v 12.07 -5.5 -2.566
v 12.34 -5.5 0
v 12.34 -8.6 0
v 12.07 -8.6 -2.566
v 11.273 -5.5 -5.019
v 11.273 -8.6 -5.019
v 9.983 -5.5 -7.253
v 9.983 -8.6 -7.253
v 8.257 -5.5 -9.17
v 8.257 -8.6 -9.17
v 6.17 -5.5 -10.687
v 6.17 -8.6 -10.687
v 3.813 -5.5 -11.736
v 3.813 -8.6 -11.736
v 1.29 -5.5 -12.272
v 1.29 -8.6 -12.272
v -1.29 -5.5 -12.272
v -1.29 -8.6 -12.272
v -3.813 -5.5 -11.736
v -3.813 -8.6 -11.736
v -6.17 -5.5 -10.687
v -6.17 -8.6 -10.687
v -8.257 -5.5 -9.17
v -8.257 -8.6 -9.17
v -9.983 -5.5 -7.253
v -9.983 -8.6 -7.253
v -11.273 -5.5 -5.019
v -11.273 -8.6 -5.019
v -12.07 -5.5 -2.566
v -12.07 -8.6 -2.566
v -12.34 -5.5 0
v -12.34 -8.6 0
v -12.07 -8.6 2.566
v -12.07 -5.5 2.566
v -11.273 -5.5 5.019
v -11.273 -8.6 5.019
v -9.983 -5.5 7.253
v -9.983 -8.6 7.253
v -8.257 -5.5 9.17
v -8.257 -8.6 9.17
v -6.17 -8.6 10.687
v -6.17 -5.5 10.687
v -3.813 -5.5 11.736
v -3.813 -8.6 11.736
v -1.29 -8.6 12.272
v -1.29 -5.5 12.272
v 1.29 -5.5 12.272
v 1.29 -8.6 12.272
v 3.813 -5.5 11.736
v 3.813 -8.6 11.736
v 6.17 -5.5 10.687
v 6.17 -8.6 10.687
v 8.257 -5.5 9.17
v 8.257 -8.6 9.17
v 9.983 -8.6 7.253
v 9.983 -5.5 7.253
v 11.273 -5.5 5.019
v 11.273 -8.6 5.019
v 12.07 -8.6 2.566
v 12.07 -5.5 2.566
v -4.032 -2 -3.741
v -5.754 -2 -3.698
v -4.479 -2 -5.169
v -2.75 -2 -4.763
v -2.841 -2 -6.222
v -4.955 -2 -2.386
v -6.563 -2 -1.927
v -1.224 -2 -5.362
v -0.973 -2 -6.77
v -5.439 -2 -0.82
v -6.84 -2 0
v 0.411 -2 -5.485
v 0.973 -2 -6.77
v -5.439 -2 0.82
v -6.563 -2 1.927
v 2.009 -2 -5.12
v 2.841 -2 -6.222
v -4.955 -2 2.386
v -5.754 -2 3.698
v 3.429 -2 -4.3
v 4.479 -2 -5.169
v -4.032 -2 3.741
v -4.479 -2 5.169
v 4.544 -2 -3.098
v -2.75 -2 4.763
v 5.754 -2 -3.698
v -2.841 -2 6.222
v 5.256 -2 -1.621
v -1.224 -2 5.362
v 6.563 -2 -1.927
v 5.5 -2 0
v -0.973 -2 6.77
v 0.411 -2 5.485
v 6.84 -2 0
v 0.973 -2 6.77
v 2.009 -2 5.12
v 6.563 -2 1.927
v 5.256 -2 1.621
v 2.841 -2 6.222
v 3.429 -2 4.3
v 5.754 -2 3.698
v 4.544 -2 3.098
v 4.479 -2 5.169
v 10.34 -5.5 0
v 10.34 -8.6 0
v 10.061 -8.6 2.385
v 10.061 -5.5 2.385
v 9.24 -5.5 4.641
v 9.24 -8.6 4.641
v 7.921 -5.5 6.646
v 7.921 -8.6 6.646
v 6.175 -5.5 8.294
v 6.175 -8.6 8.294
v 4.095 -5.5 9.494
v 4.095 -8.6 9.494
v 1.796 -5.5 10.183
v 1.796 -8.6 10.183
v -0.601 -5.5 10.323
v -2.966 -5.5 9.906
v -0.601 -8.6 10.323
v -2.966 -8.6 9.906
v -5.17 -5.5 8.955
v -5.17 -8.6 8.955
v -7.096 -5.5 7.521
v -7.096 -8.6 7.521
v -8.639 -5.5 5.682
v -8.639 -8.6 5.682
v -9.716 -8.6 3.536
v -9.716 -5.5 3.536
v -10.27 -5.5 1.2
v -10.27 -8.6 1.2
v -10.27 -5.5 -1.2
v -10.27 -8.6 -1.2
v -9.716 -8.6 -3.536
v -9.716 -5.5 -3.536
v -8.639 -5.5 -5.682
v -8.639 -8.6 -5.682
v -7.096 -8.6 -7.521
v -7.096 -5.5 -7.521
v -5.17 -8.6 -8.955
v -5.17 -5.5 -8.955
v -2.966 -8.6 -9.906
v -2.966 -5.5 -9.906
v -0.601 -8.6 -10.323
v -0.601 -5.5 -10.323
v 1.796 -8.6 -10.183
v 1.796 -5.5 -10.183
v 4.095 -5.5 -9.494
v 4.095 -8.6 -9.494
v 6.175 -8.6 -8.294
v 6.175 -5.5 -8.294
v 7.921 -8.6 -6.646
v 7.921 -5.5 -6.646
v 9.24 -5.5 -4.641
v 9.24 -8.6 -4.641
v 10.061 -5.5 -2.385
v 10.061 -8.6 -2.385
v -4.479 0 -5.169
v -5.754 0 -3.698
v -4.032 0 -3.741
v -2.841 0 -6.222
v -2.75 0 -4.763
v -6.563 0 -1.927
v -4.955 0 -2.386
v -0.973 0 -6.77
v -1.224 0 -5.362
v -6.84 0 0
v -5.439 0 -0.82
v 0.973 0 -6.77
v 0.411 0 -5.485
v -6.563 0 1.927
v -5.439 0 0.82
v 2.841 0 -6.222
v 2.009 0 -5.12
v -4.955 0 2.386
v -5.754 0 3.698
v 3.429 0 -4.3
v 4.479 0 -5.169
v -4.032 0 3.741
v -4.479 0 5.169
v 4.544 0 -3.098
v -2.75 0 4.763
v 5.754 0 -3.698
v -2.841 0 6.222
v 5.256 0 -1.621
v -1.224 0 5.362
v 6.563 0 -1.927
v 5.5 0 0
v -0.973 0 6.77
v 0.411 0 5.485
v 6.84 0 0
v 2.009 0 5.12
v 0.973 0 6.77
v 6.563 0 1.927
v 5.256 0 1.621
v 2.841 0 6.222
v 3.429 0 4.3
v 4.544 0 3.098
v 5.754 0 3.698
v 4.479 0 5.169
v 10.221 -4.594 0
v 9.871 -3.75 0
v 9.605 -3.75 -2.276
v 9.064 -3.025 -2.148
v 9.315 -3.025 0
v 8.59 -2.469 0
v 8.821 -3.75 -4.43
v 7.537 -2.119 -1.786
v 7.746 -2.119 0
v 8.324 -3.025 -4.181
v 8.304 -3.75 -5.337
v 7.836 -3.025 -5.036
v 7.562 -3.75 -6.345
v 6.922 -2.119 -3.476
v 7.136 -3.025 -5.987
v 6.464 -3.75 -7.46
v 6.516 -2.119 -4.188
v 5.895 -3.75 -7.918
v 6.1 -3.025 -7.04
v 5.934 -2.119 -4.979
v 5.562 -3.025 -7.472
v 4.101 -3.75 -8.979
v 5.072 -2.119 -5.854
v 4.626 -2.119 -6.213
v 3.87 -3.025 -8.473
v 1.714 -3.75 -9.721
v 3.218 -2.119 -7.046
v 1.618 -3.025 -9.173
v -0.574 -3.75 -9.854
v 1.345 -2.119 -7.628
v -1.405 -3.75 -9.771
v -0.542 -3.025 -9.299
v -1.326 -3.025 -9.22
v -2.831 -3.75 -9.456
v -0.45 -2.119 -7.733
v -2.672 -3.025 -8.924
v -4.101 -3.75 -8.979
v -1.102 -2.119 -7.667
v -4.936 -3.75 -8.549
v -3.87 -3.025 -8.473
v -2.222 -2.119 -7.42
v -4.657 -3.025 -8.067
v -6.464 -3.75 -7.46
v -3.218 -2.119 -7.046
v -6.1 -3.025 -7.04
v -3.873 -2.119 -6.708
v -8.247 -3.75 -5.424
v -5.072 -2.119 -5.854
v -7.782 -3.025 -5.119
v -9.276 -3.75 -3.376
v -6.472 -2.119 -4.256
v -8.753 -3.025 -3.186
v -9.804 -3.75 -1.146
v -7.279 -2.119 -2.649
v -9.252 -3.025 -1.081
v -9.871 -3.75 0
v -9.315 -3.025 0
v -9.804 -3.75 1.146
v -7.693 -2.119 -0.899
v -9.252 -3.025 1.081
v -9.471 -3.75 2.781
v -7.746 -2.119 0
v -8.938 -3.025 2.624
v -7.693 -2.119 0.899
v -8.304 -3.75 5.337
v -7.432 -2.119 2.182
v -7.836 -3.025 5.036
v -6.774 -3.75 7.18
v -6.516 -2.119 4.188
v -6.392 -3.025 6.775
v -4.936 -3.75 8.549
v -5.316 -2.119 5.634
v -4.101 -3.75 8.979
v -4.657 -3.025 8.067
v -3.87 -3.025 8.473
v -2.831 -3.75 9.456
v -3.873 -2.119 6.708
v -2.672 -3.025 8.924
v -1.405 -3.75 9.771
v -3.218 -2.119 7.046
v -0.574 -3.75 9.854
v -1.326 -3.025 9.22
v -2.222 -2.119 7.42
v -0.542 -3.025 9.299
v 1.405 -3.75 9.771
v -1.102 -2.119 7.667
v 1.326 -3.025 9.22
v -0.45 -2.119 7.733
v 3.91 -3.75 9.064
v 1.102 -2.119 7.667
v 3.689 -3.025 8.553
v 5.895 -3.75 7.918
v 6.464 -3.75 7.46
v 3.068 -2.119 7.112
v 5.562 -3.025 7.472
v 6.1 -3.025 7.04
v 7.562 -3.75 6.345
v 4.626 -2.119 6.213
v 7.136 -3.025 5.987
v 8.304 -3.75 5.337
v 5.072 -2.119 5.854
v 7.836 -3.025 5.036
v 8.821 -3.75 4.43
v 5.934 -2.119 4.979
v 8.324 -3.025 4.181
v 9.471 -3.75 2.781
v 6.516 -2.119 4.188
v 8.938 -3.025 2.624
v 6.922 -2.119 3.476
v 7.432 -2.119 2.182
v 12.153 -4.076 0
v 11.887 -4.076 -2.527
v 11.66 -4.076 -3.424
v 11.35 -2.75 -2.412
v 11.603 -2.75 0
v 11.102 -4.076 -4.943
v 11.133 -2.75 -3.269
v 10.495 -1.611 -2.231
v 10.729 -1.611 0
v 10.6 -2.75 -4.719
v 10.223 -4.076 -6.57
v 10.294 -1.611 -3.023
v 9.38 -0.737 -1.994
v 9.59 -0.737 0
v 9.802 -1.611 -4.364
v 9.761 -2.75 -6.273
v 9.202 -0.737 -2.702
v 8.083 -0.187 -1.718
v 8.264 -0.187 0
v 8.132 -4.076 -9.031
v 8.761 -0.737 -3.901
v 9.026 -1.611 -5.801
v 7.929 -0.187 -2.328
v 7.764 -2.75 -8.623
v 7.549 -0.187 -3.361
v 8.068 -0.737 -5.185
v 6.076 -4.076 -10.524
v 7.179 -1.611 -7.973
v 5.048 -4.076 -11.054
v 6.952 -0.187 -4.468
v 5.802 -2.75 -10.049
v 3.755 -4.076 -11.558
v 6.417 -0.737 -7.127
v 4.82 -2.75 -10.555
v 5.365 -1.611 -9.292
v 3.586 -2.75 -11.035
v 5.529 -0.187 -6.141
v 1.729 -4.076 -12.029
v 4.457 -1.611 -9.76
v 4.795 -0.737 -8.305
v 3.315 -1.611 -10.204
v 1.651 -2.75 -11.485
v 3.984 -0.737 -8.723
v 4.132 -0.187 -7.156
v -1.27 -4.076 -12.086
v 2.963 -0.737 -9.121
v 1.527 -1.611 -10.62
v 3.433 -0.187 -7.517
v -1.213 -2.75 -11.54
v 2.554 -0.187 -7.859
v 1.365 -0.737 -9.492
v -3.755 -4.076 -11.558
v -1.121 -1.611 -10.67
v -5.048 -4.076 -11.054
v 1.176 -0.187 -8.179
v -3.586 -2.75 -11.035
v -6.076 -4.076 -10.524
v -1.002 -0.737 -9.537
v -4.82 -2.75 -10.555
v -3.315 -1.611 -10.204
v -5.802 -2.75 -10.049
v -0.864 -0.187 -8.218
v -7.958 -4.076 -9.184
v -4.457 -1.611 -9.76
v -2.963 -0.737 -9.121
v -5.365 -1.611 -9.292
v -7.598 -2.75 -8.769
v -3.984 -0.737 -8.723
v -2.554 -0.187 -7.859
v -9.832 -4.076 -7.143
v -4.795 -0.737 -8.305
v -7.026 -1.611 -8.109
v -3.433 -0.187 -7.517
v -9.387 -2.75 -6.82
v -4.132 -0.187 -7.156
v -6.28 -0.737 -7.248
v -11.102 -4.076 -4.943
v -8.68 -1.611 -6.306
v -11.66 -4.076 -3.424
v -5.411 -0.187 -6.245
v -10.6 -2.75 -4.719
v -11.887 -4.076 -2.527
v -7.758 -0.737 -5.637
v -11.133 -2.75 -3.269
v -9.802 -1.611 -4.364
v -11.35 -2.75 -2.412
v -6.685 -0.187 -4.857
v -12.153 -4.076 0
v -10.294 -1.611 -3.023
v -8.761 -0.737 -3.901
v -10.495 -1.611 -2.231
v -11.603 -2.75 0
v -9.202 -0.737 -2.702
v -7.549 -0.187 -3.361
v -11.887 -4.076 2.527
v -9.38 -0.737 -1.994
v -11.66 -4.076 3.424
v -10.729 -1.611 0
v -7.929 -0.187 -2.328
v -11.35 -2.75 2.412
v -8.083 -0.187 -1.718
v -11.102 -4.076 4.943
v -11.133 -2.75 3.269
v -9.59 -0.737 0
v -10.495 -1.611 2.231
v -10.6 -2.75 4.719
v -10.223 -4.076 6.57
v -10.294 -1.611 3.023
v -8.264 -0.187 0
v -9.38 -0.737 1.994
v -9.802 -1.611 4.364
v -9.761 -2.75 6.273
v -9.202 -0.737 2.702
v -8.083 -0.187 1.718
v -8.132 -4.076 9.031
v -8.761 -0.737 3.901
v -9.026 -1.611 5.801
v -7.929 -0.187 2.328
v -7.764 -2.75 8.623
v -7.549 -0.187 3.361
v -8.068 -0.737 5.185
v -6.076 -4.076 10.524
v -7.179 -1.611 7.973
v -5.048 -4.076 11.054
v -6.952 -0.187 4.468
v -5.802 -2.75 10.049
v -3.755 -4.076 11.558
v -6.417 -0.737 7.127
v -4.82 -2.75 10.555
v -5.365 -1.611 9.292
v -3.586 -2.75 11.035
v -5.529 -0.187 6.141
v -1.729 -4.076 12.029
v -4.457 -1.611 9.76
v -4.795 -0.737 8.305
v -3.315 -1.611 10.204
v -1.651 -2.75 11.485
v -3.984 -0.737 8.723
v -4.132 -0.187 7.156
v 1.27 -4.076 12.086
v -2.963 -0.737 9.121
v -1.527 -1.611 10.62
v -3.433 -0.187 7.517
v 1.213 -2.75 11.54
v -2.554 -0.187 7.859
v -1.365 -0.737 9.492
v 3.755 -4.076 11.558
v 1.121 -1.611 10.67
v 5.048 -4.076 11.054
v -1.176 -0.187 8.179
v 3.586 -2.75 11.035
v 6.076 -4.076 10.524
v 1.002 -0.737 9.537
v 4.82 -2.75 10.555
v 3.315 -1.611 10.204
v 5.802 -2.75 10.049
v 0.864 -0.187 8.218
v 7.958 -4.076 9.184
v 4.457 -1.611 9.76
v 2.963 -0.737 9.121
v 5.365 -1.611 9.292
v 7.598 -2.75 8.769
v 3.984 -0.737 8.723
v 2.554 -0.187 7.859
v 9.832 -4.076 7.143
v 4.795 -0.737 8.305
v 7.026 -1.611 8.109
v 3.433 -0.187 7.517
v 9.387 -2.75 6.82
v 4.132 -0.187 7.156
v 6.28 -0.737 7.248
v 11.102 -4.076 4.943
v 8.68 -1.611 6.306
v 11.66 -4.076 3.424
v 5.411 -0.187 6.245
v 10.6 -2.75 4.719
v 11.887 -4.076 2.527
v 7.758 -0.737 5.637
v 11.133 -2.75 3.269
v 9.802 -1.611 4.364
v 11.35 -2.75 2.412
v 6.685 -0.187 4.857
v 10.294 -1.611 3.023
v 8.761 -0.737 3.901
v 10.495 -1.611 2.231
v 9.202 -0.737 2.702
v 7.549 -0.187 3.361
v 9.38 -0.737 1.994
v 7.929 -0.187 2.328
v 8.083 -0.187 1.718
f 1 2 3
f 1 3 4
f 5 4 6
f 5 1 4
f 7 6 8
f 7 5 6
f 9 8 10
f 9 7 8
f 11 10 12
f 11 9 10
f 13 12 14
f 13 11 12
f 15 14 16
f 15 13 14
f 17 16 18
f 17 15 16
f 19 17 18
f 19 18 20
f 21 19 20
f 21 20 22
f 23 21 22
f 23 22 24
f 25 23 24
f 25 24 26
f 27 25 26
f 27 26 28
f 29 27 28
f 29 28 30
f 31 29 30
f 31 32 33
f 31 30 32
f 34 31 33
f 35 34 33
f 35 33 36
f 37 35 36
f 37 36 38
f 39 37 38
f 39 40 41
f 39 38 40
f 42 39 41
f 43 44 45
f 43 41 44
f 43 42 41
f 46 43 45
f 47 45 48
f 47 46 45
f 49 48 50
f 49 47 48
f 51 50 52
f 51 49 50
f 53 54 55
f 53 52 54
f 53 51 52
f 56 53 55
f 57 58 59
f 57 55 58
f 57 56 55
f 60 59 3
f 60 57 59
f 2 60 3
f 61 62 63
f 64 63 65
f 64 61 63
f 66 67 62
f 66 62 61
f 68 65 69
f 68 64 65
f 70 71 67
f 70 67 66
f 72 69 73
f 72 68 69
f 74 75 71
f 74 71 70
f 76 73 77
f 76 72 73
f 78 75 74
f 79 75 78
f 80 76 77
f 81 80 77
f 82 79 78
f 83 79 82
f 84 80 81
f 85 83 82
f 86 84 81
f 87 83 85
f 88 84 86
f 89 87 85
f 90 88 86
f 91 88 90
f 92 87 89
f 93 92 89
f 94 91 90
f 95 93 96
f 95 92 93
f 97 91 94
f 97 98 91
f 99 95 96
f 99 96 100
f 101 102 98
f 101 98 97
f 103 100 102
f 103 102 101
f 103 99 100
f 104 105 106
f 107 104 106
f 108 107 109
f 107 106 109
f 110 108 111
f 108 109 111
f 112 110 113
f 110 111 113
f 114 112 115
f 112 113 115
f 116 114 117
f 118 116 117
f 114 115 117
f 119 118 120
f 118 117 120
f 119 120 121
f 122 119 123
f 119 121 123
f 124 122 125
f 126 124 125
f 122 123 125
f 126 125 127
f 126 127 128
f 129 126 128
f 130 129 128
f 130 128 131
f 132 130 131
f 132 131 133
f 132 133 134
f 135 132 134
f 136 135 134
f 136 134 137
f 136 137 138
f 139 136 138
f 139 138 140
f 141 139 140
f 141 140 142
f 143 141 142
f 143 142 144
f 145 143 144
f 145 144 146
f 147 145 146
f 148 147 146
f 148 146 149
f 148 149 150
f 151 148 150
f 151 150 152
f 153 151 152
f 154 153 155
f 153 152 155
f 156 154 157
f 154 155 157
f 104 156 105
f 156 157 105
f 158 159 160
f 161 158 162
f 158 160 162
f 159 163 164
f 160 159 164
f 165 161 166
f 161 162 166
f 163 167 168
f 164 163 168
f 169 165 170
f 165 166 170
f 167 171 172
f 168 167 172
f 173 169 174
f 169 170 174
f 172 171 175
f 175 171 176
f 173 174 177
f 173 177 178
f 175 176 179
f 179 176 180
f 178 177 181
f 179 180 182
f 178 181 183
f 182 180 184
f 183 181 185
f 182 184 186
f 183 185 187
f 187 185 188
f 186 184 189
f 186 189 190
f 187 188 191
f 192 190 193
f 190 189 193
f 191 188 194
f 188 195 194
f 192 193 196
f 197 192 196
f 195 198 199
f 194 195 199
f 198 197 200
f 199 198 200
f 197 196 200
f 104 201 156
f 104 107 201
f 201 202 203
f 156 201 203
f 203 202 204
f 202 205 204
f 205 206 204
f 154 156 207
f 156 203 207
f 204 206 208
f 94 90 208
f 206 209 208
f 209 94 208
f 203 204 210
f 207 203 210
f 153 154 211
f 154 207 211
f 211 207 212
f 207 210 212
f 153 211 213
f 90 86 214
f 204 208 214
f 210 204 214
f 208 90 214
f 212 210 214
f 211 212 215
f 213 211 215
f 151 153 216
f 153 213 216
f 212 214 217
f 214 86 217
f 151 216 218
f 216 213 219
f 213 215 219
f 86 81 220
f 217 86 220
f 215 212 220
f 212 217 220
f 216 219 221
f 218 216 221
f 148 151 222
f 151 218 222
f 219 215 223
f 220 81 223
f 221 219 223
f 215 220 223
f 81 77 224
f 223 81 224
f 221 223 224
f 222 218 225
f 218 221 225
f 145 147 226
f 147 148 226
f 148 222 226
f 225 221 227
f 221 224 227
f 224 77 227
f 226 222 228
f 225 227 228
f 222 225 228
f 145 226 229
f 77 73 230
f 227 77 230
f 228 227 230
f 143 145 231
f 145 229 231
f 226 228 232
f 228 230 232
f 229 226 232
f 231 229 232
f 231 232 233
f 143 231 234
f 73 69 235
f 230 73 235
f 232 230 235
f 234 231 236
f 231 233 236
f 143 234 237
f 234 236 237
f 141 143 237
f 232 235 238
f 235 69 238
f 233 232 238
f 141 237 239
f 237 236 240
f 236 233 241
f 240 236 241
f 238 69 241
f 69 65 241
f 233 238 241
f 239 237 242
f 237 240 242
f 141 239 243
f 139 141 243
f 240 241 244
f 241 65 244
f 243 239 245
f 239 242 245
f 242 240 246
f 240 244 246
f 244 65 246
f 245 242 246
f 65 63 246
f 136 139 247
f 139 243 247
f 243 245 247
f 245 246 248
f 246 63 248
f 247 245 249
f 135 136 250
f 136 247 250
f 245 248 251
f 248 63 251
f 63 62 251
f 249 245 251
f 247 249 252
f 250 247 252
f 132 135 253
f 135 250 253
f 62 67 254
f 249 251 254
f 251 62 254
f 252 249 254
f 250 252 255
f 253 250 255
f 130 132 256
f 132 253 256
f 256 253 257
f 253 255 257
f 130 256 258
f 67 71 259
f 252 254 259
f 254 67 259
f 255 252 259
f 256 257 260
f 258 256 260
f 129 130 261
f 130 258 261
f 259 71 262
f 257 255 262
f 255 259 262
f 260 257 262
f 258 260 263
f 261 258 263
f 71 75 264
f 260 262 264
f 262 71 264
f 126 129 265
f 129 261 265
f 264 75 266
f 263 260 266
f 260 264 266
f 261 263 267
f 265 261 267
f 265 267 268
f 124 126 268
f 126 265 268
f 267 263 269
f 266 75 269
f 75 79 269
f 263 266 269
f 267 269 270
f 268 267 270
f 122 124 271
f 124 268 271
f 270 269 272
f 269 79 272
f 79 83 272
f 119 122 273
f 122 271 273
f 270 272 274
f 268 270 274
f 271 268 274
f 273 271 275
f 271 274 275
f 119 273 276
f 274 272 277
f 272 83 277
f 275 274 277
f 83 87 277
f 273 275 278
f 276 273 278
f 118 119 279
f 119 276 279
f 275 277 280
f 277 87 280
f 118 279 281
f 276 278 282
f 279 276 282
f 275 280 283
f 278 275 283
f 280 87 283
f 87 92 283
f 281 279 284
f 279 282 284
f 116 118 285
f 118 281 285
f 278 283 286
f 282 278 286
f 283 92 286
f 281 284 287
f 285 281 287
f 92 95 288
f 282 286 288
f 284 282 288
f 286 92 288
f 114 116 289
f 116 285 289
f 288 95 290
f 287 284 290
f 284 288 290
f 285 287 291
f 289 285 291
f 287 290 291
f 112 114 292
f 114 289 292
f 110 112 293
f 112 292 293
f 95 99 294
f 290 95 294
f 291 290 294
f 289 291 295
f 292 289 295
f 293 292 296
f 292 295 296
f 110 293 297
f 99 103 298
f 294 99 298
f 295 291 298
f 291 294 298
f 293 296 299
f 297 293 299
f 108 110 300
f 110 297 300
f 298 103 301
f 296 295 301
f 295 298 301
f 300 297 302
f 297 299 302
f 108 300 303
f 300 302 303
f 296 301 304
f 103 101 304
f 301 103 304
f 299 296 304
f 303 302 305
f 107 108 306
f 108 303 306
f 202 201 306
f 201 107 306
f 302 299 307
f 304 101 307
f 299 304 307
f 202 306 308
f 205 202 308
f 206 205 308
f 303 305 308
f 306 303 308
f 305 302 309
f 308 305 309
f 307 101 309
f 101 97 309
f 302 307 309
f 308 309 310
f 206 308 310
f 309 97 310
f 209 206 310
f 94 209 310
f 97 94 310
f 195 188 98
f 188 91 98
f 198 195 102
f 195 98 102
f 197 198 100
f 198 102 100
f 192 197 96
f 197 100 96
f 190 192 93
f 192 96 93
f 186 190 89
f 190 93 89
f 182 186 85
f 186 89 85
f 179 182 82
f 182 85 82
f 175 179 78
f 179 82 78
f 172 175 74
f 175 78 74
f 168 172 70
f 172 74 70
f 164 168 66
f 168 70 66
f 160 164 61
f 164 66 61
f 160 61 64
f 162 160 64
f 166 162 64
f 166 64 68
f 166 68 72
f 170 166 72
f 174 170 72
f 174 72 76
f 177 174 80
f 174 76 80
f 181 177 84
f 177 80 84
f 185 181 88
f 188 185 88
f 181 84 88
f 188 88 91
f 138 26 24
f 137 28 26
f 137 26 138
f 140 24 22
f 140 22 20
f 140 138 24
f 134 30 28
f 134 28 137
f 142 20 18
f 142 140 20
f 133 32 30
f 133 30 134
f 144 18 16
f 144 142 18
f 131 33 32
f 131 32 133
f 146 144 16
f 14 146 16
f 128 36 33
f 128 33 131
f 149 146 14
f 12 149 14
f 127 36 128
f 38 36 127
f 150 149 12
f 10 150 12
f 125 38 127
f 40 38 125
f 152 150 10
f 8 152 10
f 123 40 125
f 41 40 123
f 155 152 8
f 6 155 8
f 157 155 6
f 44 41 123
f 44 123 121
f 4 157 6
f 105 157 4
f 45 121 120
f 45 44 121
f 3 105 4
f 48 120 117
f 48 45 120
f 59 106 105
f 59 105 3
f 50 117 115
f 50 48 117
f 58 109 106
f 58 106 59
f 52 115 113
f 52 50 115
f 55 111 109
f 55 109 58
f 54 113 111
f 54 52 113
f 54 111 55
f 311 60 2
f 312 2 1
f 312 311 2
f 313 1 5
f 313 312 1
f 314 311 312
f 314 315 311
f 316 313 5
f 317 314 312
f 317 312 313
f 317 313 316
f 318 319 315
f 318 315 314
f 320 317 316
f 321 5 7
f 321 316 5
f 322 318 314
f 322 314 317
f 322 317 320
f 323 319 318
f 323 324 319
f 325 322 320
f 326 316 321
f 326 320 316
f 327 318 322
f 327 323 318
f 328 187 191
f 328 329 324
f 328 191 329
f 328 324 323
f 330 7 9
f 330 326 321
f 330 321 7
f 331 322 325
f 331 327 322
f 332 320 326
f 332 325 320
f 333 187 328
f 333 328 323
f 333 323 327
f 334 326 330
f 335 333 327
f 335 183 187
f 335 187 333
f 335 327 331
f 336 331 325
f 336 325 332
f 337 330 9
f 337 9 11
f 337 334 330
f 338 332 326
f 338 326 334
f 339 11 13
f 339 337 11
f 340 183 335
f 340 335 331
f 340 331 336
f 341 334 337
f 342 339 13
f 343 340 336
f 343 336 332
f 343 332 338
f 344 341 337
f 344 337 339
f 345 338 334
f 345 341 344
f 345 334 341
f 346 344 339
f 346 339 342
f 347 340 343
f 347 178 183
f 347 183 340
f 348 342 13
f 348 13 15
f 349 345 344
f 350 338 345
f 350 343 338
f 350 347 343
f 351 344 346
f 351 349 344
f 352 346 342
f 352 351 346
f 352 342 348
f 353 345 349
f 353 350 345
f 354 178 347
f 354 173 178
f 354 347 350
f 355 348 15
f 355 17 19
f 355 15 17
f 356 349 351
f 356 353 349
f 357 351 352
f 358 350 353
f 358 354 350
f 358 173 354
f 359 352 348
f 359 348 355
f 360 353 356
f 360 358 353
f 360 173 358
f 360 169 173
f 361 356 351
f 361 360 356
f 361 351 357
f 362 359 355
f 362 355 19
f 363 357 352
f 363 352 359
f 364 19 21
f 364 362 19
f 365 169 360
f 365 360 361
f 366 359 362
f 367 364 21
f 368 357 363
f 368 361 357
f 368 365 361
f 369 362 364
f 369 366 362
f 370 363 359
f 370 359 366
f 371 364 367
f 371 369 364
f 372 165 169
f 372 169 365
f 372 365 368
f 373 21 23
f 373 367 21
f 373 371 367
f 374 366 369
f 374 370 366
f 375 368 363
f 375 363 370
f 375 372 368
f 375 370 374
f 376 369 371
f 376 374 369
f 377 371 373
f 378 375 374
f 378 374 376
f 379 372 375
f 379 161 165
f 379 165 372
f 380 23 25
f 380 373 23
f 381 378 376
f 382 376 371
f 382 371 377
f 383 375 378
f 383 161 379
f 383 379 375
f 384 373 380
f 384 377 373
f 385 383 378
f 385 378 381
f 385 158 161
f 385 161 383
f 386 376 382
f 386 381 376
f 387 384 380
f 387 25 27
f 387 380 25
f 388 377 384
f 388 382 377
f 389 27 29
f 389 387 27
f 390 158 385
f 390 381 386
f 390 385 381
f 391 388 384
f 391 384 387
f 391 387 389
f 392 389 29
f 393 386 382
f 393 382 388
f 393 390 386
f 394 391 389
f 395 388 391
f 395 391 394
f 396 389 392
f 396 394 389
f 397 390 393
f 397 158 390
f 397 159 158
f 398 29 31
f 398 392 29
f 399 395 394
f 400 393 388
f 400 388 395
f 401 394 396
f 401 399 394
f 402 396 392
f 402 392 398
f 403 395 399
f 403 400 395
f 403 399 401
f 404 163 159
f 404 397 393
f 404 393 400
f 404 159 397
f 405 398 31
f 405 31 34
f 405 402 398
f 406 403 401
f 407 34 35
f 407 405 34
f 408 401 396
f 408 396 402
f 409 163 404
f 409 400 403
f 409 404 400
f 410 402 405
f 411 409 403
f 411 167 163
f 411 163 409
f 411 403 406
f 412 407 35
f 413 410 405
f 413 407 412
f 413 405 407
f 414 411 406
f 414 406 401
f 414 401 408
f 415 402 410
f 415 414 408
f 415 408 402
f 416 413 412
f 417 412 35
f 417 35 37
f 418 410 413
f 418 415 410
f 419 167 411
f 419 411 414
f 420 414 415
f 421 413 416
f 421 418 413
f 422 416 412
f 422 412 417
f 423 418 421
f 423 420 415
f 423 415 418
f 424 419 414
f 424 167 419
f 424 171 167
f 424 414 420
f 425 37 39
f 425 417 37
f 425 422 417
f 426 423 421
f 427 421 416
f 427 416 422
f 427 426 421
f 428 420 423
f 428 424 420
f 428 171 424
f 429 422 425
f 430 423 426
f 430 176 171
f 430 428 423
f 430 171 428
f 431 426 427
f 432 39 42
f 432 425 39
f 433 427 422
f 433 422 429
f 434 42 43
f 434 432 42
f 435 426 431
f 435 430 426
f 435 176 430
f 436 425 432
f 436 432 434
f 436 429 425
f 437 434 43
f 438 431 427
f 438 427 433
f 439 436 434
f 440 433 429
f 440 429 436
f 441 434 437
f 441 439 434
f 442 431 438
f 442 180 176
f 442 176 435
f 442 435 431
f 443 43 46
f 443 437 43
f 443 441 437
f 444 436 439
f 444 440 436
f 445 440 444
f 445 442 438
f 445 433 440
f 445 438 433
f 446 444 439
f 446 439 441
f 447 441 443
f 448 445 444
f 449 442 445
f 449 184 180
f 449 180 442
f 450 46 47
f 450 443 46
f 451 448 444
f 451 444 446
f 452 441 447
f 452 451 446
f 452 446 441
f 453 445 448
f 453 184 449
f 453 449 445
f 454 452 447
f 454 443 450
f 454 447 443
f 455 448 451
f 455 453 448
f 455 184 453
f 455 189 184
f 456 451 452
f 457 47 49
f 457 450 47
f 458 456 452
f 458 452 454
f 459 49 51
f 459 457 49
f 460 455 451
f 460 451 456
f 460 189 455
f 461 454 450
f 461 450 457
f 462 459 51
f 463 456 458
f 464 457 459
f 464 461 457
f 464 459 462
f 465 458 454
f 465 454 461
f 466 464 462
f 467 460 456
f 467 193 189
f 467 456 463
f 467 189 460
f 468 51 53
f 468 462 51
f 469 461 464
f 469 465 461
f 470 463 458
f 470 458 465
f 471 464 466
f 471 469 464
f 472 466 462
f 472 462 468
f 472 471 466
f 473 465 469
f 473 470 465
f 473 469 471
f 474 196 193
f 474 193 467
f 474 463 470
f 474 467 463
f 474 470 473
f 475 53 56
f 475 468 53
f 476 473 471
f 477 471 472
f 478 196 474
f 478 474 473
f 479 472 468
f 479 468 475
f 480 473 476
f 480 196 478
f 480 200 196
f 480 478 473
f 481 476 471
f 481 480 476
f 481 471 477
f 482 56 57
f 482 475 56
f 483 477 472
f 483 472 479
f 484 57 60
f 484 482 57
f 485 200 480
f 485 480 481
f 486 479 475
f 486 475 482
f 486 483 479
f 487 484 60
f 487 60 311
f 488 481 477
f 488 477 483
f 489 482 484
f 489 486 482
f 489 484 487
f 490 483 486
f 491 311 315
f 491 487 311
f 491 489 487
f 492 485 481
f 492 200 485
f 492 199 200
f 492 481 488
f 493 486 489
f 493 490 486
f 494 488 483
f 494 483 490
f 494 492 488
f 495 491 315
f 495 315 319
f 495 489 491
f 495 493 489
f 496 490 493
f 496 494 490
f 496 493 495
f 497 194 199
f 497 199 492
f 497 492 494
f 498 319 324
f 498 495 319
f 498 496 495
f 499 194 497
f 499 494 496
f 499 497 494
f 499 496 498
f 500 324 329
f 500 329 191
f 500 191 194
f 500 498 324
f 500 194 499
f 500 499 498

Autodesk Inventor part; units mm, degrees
ref_plane "YZ Plane" through (0, 0, 0) normal (1, 0, 0) x (0, 1, 0)
ref_plane "XZ Plane" through (0, 0, 0) normal (0, 1, 0) x (-1, 0, 0)
ref_plane "XY Plane" through (0, 0, 0) normal (0, 0, 1) x (1, 0, 0)
sketch "Sketch1" plane through (0, 0, 0) normal (0, 0, 1) x (1, 0, 0)
  line L0 (0, 0) -> (5.5, 0) construction
  line L1 (5.5, 0) -> (5.5, -2)
  line L2 (0, -8.6) -> (12.34, -8.6) construction
  line L3 (12.34, -8.6) -> (12.34, -5.5)
  line L4 (5.5, -2) -> (6.84, -2)
  line L5 (10.34, -5.5) -> (10.34, -8.6)
  line L6 (5.5, 0) -> (6.84, 0)
  arc A0 (10.34, -5.5) -> (6.84, -2) centre (6.84, -5.5) ccw
  arc A1 (12.34, -5.5) -> (6.84, 0) centre (6.84, -5.5) ccw
  line L7 (10.34, -8.6) -> (12.34, -8.6)
  line L8 (0, 0) -> (0, -8.6)
  dimension "d0" = 5.5
  dimension "d1" = 2
  dimension "d2" = 12.34
  dimension "d3" = 8.6
  dimension "d6" = 2
  dimension "d7" = 0
  dimension "d8" = 3.5
  dimension "d9" = 5.5
revolve "Revolution1" add sketch "Sketch1" angle 360 about axis through (0, 0, 0) along (0, -1, 0)
properties part number "BallBearingCup"
